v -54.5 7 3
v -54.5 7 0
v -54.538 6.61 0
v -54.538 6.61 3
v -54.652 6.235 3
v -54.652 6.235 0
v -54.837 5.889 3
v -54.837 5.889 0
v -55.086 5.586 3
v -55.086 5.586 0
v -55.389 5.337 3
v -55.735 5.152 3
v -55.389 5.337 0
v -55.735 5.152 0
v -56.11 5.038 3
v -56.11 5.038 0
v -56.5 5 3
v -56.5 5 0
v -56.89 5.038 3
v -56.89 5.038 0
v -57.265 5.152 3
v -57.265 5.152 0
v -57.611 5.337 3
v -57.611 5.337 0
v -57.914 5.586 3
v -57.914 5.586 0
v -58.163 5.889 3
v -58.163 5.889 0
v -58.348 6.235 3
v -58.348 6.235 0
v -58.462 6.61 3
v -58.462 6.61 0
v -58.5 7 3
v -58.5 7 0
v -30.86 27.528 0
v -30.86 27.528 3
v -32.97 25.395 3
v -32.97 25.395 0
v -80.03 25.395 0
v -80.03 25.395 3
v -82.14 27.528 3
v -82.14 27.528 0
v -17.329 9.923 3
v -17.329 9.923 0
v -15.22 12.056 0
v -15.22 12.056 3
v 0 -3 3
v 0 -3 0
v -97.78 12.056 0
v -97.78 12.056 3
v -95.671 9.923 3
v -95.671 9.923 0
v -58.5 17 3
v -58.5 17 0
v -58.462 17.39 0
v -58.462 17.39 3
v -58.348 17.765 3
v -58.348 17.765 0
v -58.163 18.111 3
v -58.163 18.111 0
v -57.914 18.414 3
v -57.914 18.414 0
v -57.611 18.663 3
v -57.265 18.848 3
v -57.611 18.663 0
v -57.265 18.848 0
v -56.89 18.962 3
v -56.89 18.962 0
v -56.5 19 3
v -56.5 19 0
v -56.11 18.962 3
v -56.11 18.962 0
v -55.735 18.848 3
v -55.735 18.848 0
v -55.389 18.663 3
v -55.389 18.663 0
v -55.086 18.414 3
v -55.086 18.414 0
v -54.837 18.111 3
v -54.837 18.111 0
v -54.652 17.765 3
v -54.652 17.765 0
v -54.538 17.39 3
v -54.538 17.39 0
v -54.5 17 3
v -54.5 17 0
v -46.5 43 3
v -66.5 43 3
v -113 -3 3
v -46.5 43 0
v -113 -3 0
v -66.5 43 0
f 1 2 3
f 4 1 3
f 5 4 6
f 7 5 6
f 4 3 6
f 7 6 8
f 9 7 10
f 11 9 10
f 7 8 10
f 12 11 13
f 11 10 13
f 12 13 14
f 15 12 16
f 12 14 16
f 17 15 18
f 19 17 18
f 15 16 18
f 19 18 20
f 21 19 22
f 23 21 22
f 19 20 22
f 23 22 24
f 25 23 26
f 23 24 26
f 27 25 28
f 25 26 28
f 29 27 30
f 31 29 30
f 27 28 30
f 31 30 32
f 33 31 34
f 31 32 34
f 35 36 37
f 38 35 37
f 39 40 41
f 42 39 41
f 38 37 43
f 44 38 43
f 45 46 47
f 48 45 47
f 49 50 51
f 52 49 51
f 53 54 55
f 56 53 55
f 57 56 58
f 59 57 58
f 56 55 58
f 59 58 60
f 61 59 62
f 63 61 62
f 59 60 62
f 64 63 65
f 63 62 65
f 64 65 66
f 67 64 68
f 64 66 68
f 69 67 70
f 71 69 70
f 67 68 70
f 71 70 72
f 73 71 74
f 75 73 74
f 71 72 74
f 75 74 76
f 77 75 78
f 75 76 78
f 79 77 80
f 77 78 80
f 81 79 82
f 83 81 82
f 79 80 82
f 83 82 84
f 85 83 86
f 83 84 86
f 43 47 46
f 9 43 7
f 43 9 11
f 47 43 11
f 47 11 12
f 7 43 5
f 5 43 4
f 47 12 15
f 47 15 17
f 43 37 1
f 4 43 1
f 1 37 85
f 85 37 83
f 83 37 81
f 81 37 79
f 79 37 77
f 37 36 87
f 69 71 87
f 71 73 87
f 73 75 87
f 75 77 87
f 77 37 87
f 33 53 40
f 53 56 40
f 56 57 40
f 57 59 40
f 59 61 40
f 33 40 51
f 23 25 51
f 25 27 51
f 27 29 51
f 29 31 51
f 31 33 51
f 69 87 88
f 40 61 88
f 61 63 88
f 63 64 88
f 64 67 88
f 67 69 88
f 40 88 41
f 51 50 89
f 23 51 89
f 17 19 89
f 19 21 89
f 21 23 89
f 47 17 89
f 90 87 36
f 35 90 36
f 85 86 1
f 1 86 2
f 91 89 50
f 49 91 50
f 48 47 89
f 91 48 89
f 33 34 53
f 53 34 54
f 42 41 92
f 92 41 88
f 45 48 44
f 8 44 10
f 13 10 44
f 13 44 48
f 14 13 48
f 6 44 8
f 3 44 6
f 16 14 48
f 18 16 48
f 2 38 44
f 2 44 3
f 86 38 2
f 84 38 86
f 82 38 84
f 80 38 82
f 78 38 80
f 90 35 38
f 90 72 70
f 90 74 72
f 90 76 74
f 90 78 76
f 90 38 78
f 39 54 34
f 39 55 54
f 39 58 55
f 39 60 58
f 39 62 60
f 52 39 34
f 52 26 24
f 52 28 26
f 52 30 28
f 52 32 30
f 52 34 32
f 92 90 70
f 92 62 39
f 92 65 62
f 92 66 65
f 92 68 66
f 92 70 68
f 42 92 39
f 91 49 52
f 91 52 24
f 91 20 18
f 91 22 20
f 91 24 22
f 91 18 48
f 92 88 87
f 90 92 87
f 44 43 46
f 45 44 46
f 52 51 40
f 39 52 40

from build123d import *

# Parameters (mm, degrees)
F1_DEPTH = 3
F3_DEPTH = 25
F4_ANGLE = 90
F5_ANGLE = -180


with BuildPart() as f1:
    # F0 (on Front) → F1 (new body)
    with BuildSketch(Plane.XZ):
        Polygon((66.5, 46), (46.5, 46), (30.8597909292, 30.5279652203), (32.9696138537, 28.395209438), (17.329404783, 12.9231746583), (15.2195818585, 15.0559304407), (0, 0), (113, 0), (97.7804181415, 15.0559304407), (95.670595217, 12.9231746583), (80.0303861463, 28.395209438), (82.1402090708, 30.5279652203), align=None)
    extrude(amount=F1_DEPTH)

    # F2 (on face) → F3 (cut)
    with BuildSketch(Plane.XZ.offset(3)):
        with BuildLine():
            Line((58.5, 10), (58.5, 19.6270607412))
            Line((58.5, 19.6270607412), (58.5, 20))
            ThreePointArc((58.5, 20), (56.5, 22), (54.5, 20))
            Line((54.5, 20), (54.5, 10))
            ThreePointArc((54.5, 10), (56.5, 8), (58.5, 10))
        make_face()
    extrude(amount=-F3_DEPTH, mode=Mode.SUBTRACT)


with BuildPart() as f1_1:
    # F4: moved
    add(f1.part.rotate(Axis((56.5, -3, 0), (1, 0, 0)), F4_ANGLE))


with BuildPart() as f1_2:
    # F5: moved
    add(f1_1.part.rotate(Axis((0, -3, 1.5), (0, 0, 1)), F5_ANGLE))


solid = f1_2.part
